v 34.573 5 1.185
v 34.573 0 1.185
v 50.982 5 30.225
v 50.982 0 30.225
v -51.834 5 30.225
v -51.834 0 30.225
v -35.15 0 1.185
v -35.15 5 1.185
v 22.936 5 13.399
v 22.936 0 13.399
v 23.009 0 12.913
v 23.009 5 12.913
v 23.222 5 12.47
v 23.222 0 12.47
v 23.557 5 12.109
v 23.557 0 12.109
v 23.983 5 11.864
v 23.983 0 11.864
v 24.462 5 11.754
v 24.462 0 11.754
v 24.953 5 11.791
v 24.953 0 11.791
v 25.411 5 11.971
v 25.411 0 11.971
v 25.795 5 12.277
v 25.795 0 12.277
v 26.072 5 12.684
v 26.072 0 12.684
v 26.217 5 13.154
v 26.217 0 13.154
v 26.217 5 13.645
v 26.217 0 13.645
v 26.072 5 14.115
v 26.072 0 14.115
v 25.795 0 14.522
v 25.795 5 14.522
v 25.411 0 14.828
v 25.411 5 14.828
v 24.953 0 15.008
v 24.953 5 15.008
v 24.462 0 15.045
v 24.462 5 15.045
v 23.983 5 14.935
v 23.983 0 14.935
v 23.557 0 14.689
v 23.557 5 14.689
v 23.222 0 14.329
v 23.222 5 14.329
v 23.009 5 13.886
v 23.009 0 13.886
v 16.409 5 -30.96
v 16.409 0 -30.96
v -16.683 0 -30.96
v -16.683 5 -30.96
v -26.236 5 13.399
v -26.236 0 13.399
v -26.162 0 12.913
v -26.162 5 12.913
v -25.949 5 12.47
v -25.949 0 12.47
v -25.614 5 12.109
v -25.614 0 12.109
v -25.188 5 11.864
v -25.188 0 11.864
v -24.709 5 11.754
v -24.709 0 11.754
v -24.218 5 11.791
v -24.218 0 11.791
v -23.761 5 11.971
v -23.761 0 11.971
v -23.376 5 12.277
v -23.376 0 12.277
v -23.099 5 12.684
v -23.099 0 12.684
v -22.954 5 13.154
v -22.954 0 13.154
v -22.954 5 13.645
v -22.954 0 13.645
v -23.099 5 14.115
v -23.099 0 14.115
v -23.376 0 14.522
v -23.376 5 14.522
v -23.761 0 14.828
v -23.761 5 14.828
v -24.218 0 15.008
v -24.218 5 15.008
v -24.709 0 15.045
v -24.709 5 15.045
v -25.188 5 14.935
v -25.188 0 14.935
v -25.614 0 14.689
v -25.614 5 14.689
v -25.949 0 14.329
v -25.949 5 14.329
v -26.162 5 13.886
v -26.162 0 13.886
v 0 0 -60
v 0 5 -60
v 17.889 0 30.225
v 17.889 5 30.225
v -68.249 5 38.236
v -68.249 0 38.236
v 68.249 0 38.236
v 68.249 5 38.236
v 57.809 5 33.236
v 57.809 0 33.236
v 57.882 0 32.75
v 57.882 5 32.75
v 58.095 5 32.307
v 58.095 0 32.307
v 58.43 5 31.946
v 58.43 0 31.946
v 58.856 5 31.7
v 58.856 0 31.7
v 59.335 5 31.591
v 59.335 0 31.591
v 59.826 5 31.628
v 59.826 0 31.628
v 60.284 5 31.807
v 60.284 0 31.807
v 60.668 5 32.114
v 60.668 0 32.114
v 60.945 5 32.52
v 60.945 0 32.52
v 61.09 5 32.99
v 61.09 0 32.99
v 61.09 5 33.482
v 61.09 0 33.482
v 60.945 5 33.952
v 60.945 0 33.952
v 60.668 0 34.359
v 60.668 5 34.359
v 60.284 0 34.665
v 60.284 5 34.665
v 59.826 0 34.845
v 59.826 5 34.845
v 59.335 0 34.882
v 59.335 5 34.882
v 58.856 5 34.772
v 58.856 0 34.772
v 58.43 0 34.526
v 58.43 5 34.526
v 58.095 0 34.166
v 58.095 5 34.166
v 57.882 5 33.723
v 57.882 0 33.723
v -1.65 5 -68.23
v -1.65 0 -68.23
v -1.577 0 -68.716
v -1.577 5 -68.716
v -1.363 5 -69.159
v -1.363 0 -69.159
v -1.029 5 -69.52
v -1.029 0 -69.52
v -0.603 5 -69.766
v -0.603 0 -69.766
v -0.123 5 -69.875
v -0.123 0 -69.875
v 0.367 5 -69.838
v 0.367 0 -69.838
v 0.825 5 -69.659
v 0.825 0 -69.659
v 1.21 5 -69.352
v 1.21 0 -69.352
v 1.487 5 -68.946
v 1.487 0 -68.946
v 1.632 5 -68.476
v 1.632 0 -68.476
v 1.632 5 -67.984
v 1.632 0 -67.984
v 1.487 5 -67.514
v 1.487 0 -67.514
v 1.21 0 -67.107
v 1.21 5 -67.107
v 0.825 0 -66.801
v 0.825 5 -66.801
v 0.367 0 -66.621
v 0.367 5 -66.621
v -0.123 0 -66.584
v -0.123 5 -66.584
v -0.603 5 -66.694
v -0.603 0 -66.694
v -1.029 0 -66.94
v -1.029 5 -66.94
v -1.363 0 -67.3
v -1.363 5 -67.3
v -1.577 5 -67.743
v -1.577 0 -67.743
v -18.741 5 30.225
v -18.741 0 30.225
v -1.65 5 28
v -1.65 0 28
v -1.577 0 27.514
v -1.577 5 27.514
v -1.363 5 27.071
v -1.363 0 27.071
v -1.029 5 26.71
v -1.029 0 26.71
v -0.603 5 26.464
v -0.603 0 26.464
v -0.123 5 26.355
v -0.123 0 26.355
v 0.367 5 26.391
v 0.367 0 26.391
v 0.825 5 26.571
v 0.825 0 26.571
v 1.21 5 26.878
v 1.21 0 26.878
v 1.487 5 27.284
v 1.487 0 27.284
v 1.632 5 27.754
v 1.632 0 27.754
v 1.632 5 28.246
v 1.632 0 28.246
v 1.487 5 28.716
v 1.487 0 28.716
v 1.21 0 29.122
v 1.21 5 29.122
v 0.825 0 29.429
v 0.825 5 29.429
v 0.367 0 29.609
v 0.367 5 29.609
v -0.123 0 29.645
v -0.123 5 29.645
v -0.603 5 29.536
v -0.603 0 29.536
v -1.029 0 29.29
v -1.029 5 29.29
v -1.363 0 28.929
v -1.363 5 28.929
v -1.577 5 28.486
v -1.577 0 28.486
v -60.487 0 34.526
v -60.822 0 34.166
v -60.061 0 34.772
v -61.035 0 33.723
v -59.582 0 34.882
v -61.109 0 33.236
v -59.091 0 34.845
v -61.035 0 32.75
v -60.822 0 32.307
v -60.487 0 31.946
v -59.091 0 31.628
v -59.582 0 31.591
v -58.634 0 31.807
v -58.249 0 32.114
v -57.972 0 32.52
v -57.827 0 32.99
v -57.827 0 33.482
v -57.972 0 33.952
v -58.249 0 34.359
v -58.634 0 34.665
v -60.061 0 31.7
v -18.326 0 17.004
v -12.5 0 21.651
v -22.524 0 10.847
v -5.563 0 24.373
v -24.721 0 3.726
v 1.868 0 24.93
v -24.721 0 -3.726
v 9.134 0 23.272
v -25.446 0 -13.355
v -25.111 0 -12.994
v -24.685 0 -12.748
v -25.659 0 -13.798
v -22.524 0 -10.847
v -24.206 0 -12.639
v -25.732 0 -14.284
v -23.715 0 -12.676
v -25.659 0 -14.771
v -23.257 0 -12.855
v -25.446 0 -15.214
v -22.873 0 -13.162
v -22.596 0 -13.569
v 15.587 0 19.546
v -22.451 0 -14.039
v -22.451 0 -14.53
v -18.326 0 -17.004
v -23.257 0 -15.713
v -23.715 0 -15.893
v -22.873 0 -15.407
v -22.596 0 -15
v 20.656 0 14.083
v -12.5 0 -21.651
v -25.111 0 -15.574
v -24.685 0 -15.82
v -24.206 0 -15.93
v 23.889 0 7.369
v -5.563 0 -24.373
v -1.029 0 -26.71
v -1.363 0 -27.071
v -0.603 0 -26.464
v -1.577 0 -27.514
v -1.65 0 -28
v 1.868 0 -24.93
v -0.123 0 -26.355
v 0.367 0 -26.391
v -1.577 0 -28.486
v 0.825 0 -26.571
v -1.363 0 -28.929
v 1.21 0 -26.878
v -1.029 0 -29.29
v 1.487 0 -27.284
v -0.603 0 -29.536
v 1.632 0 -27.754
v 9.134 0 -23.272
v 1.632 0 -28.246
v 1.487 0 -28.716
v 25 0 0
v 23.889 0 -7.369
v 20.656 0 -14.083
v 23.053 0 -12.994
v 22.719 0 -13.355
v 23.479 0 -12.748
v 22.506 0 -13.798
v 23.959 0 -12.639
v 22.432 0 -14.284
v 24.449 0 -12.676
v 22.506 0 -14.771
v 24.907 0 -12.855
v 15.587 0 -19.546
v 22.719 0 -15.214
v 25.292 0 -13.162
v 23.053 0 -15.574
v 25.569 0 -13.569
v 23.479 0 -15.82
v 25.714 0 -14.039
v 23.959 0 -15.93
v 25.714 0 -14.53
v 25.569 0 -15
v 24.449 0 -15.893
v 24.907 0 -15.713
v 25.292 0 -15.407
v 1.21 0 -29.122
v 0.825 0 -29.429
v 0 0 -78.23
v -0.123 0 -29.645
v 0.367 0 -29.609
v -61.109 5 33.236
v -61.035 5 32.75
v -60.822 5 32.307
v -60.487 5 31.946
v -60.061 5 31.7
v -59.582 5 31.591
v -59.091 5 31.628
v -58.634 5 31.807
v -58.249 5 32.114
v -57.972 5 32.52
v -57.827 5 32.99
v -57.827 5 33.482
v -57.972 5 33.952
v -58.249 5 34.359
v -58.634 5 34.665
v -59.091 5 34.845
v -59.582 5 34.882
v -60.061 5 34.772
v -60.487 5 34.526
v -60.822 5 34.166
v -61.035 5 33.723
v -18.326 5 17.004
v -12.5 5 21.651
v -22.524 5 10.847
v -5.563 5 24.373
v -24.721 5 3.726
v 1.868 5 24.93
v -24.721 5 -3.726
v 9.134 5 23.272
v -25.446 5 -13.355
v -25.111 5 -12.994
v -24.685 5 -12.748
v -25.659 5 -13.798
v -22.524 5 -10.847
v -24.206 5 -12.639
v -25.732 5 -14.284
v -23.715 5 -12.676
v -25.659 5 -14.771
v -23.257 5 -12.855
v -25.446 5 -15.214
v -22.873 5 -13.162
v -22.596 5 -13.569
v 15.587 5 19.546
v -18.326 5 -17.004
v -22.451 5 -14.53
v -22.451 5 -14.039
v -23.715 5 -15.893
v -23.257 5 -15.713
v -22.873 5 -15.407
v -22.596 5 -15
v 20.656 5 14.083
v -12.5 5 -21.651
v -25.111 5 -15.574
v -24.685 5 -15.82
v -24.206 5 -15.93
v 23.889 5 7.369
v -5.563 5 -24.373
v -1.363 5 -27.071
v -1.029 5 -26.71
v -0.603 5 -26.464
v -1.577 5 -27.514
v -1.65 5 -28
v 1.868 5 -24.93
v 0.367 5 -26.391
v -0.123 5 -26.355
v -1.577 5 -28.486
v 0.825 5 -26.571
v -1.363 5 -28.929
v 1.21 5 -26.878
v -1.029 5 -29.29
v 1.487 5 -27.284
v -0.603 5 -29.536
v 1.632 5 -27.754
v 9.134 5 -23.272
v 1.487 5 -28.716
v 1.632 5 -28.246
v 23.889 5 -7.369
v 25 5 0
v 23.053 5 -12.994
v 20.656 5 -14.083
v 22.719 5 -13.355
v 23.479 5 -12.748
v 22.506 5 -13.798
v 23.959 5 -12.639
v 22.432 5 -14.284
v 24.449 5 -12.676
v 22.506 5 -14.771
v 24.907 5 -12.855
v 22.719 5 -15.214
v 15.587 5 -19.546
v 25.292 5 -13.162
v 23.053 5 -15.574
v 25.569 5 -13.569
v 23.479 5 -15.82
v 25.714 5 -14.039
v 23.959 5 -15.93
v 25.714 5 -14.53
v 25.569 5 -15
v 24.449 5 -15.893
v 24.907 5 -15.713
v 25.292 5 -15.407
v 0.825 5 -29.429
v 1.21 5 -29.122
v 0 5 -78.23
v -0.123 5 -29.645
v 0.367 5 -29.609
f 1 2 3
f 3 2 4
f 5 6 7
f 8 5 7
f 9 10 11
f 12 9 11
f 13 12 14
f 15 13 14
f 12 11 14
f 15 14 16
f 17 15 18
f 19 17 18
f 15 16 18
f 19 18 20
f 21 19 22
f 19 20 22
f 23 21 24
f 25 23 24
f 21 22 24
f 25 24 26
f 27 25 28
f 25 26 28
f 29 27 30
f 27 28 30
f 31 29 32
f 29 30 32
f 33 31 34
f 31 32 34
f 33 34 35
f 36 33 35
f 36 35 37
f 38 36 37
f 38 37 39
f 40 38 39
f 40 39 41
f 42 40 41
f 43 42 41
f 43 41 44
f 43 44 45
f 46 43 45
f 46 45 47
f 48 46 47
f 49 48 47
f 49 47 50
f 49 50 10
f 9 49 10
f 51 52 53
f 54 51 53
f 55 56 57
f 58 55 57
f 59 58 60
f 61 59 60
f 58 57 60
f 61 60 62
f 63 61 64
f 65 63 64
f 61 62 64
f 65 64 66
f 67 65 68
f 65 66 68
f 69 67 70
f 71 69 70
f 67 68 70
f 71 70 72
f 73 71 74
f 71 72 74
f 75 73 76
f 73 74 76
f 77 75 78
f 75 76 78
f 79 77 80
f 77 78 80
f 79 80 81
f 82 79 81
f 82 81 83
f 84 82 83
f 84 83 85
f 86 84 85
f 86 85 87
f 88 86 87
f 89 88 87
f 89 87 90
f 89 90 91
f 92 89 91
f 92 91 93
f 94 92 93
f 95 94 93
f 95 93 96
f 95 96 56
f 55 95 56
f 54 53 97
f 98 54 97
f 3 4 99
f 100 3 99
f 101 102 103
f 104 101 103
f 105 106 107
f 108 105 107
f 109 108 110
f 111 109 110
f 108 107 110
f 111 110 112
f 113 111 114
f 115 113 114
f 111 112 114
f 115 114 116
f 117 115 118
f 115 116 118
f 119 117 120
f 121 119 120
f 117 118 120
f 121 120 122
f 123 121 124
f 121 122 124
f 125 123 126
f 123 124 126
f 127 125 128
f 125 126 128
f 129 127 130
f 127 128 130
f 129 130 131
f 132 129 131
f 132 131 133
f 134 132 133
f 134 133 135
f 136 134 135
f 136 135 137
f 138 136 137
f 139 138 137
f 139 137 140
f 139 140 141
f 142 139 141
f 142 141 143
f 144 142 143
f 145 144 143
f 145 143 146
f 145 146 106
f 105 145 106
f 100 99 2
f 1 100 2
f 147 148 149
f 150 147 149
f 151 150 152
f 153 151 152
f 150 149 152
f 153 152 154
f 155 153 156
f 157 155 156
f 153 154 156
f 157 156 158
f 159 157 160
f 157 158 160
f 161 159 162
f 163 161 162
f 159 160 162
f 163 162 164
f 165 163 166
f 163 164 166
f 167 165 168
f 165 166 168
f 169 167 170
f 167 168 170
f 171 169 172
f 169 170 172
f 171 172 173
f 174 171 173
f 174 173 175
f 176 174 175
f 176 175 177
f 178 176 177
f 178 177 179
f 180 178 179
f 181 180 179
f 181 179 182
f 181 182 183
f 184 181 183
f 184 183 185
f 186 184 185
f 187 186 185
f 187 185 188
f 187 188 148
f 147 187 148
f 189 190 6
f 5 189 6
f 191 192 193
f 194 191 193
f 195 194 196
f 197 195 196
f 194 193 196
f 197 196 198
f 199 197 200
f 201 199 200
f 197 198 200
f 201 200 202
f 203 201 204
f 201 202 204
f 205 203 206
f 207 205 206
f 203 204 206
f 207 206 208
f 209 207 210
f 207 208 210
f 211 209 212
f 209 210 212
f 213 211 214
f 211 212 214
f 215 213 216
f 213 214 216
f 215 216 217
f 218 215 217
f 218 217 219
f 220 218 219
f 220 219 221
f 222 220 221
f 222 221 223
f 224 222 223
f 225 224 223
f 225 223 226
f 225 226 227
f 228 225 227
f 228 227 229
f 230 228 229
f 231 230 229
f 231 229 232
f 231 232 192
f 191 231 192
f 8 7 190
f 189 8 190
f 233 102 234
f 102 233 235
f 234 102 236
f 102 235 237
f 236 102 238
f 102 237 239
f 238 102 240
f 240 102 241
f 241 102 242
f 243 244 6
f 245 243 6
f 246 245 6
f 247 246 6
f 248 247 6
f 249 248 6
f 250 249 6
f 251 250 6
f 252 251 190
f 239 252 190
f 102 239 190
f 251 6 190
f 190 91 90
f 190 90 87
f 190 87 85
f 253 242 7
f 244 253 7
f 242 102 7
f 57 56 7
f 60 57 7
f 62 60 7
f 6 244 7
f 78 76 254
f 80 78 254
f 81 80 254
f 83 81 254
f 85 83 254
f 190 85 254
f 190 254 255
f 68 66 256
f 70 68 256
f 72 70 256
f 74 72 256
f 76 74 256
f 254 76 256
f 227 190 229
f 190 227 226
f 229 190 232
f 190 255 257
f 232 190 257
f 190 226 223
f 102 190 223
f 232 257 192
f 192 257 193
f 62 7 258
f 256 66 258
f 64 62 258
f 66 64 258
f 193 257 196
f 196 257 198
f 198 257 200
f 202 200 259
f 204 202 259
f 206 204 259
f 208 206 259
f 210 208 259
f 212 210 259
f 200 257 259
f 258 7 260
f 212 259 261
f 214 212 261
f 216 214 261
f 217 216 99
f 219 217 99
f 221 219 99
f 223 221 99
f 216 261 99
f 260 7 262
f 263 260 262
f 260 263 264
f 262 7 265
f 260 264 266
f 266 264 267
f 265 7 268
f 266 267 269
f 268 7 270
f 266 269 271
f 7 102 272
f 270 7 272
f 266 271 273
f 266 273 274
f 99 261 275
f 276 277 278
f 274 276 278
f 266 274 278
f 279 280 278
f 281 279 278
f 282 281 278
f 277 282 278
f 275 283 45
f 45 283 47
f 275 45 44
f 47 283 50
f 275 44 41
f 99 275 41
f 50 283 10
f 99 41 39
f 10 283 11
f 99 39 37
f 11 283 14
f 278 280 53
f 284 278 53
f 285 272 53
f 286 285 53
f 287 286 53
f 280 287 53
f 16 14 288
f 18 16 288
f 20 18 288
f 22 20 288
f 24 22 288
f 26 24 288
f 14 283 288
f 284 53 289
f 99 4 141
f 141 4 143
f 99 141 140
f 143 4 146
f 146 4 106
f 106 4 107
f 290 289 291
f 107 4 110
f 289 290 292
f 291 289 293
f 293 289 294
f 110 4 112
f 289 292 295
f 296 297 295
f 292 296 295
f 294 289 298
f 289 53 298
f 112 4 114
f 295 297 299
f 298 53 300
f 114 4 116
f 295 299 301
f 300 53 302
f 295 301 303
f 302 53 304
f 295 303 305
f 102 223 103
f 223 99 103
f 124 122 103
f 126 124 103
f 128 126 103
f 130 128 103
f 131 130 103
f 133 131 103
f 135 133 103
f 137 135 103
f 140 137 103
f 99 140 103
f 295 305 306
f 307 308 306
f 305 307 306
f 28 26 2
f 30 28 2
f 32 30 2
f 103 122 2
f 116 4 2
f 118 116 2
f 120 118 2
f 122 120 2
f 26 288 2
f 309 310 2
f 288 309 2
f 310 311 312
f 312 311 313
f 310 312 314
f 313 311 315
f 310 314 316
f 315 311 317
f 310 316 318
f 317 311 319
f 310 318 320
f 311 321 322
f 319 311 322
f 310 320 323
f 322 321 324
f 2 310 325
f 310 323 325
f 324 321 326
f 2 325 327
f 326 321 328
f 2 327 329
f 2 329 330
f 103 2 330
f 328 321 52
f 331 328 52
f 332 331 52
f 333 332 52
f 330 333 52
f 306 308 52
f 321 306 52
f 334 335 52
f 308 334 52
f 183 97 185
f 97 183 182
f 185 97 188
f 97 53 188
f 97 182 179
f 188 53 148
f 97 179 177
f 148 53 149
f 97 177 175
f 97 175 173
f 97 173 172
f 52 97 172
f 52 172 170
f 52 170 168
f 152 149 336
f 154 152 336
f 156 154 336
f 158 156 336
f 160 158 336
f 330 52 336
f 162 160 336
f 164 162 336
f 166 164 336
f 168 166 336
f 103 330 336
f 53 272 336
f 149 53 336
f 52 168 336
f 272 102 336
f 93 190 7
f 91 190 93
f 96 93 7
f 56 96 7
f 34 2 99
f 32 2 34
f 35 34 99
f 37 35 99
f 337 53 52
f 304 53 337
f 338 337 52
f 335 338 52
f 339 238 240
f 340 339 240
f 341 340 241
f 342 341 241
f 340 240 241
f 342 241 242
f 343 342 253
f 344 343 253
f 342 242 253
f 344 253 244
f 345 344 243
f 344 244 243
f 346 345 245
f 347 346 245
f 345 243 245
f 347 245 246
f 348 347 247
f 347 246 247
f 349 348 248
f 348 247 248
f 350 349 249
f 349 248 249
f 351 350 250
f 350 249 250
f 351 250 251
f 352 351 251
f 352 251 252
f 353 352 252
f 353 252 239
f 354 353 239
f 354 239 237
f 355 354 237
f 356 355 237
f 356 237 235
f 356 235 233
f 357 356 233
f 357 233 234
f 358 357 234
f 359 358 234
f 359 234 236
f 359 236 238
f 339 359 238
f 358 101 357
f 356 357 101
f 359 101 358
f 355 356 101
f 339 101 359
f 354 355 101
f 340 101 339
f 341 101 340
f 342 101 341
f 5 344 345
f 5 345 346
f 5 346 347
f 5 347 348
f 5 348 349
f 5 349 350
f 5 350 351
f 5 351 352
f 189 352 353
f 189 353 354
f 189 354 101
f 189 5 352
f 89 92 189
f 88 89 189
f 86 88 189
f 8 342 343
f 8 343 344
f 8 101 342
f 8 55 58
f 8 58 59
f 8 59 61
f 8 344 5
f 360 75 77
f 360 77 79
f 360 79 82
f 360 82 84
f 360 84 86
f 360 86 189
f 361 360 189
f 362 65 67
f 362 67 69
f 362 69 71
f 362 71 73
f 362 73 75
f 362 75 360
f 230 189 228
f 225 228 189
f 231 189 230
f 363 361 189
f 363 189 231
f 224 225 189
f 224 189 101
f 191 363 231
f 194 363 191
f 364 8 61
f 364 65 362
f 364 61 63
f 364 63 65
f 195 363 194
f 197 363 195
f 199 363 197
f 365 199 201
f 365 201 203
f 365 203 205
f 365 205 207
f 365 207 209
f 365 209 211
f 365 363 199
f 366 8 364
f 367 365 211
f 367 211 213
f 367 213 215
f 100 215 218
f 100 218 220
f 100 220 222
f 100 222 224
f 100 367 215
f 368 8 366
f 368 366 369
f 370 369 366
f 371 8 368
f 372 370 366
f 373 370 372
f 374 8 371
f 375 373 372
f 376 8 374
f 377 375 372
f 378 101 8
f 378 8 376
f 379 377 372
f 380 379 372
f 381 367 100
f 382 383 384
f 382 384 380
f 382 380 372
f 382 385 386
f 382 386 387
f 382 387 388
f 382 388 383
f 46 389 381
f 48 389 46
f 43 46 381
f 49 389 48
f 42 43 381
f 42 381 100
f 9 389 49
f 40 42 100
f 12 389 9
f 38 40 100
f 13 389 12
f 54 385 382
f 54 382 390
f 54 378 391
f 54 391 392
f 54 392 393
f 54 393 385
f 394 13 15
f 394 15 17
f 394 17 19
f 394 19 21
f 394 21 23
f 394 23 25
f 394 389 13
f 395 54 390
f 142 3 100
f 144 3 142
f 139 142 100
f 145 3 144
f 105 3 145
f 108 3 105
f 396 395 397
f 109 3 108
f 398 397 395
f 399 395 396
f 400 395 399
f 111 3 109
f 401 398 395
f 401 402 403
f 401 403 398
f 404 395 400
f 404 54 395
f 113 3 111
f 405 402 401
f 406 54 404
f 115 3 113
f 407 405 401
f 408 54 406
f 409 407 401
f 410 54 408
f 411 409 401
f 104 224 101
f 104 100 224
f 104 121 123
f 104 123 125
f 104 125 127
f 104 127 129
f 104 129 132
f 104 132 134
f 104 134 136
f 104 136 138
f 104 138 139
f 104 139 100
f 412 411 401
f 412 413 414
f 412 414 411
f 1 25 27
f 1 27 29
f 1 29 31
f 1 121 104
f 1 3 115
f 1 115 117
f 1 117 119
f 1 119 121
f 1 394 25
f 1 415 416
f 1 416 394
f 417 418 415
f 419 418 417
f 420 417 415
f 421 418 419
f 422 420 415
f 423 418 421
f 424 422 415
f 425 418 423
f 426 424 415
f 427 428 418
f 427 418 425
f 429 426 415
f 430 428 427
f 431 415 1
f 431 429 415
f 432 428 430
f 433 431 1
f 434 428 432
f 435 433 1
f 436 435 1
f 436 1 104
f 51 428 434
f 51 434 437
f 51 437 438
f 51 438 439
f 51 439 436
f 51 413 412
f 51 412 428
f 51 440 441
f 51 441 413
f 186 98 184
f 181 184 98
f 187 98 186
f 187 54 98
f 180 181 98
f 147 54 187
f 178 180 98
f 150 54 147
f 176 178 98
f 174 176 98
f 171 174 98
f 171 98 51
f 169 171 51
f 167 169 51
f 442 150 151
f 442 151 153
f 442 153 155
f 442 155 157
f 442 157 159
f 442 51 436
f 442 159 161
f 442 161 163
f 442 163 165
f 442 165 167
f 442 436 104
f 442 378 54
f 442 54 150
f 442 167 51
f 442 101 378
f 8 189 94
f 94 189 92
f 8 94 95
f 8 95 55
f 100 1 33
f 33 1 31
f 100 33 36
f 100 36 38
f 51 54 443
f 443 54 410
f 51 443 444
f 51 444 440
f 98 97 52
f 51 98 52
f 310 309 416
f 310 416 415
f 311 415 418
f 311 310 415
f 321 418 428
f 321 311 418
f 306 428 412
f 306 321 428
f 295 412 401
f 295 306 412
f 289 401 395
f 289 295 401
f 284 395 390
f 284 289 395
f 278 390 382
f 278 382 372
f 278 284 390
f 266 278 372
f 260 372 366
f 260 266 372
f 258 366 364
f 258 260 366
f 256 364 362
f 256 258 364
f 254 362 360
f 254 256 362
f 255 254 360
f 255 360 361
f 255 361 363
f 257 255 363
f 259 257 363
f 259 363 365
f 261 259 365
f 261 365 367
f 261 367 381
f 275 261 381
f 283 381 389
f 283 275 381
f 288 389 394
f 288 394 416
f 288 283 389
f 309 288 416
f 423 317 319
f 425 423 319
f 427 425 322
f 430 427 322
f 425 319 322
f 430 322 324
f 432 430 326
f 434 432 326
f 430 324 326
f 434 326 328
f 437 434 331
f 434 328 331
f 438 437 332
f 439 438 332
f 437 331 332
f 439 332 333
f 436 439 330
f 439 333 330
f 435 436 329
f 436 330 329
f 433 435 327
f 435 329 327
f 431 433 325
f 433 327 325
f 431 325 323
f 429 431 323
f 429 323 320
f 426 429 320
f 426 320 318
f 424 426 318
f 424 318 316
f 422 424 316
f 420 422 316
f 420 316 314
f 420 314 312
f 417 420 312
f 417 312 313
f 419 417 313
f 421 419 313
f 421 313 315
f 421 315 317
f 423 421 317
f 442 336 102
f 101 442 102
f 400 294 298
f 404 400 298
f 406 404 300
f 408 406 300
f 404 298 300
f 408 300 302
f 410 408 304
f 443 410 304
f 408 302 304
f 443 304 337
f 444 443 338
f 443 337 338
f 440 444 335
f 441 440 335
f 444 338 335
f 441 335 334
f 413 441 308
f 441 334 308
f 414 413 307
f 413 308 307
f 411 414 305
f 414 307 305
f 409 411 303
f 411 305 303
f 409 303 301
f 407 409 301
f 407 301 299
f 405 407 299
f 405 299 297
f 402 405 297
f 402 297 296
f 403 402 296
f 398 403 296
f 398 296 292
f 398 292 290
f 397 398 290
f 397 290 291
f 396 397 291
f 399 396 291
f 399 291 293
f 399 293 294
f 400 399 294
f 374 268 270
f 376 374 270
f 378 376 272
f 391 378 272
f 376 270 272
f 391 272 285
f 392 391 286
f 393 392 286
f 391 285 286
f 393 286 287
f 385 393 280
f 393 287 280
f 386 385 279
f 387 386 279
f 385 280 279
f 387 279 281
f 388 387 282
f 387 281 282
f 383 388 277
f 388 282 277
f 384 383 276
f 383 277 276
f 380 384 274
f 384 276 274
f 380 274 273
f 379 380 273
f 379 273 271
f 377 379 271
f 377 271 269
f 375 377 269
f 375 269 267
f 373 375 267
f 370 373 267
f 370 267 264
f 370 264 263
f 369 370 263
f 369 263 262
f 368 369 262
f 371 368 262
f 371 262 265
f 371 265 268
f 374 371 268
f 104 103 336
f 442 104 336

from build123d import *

# Parameters (mm, degrees)
SKETCH_1_R             = 25
EXTRUDE_1_DEPTH        = 5
HOLE_WIZARD_M4_2_D     = 3.3
HOLE_WIZARD_M4_2_DEPTH = 10.1
HOLE_WIZARD_M4_2_TIP   = 0.991420021
HOLE_WIZARD_M4_4_D     = 3.3
HOLE_WIZARD_M4_4_DEPTH = 10.1
HOLE_WIZARD_M4_4_TIP   = 0.991420021


with BuildPart() as part:
    # 草图1 → 凸台-拉伸1 (new body)
    with BuildSketch(Plane(origin=(0, 0, 0), x_dir=(1, 0, 0), z_dir=(0, 1, 0))):
        Polygon((0, 78.229669783), (-68.248539171, -38.236345737), (68.248539171, -38.236345737), align=None)
        Polygon((0, 60), (16.409255523, 30.960045876), (-16.683374686, 30.960045876), align=None, mode=Mode.SUBTRACT)
        Polygon((34.572863234, -1.184638197), (50.982118757, -30.224592321), (17.889488548, -30.224592321), align=None, mode=Mode.SUBTRACT)
        Polygon((-18.741152763, -30.224592321), (-51.833782972, -30.224592321), (-35.150408286, -1.184638197), align=None, mode=Mode.SUBTRACT)
        Circle(SKETCH_1_R, mode=Mode.SUBTRACT)
    extrude(amount=EXTRUDE_1_DEPTH)

    # M4 螺纹孔2
    with Locations(Plane(origin=(0, 5, 0), x_dir=(1, 0, 0), z_dir=(0, 1, 0))):
        with Locations((-24.082253567, 14.284434295), (0, 28), (24.082253567, 14.284434295), (24.585652853, -13.39946543), (0, -28), (-24.585652853, -13.39946543)):
            Hole(HOLE_WIZARD_M4_2_D / 2, depth=HOLE_WIZARD_M4_2_DEPTH)
            with Locations((0, 0, -(HOLE_WIZARD_M4_2_DEPTH + HOLE_WIZARD_M4_2_TIP / 2))):  # 118° drill point
                Cone(0, HOLE_WIZARD_M4_2_D / 2, HOLE_WIZARD_M4_2_TIP, mode=Mode.SUBTRACT)

    # M4 螺纹孔4
    with Locations(Plane(origin=(0, 5, 0), x_dir=(1, 0, 0), z_dir=(0, 1, 0))):
        with Locations((59.458609482, -33.236345737), (0, 68.229669783), (-59.458609482, -33.236345737)):
            Hole(HOLE_WIZARD_M4_4_D / 2, depth=HOLE_WIZARD_M4_4_DEPTH)
            with Locations((0, 0, -(HOLE_WIZARD_M4_4_DEPTH + HOLE_WIZARD_M4_4_TIP / 2))):  # 118° drill point
                Cone(0, HOLE_WIZARD_M4_4_D / 2, HOLE_WIZARD_M4_4_TIP, mode=Mode.SUBTRACT)


solid = part.part
